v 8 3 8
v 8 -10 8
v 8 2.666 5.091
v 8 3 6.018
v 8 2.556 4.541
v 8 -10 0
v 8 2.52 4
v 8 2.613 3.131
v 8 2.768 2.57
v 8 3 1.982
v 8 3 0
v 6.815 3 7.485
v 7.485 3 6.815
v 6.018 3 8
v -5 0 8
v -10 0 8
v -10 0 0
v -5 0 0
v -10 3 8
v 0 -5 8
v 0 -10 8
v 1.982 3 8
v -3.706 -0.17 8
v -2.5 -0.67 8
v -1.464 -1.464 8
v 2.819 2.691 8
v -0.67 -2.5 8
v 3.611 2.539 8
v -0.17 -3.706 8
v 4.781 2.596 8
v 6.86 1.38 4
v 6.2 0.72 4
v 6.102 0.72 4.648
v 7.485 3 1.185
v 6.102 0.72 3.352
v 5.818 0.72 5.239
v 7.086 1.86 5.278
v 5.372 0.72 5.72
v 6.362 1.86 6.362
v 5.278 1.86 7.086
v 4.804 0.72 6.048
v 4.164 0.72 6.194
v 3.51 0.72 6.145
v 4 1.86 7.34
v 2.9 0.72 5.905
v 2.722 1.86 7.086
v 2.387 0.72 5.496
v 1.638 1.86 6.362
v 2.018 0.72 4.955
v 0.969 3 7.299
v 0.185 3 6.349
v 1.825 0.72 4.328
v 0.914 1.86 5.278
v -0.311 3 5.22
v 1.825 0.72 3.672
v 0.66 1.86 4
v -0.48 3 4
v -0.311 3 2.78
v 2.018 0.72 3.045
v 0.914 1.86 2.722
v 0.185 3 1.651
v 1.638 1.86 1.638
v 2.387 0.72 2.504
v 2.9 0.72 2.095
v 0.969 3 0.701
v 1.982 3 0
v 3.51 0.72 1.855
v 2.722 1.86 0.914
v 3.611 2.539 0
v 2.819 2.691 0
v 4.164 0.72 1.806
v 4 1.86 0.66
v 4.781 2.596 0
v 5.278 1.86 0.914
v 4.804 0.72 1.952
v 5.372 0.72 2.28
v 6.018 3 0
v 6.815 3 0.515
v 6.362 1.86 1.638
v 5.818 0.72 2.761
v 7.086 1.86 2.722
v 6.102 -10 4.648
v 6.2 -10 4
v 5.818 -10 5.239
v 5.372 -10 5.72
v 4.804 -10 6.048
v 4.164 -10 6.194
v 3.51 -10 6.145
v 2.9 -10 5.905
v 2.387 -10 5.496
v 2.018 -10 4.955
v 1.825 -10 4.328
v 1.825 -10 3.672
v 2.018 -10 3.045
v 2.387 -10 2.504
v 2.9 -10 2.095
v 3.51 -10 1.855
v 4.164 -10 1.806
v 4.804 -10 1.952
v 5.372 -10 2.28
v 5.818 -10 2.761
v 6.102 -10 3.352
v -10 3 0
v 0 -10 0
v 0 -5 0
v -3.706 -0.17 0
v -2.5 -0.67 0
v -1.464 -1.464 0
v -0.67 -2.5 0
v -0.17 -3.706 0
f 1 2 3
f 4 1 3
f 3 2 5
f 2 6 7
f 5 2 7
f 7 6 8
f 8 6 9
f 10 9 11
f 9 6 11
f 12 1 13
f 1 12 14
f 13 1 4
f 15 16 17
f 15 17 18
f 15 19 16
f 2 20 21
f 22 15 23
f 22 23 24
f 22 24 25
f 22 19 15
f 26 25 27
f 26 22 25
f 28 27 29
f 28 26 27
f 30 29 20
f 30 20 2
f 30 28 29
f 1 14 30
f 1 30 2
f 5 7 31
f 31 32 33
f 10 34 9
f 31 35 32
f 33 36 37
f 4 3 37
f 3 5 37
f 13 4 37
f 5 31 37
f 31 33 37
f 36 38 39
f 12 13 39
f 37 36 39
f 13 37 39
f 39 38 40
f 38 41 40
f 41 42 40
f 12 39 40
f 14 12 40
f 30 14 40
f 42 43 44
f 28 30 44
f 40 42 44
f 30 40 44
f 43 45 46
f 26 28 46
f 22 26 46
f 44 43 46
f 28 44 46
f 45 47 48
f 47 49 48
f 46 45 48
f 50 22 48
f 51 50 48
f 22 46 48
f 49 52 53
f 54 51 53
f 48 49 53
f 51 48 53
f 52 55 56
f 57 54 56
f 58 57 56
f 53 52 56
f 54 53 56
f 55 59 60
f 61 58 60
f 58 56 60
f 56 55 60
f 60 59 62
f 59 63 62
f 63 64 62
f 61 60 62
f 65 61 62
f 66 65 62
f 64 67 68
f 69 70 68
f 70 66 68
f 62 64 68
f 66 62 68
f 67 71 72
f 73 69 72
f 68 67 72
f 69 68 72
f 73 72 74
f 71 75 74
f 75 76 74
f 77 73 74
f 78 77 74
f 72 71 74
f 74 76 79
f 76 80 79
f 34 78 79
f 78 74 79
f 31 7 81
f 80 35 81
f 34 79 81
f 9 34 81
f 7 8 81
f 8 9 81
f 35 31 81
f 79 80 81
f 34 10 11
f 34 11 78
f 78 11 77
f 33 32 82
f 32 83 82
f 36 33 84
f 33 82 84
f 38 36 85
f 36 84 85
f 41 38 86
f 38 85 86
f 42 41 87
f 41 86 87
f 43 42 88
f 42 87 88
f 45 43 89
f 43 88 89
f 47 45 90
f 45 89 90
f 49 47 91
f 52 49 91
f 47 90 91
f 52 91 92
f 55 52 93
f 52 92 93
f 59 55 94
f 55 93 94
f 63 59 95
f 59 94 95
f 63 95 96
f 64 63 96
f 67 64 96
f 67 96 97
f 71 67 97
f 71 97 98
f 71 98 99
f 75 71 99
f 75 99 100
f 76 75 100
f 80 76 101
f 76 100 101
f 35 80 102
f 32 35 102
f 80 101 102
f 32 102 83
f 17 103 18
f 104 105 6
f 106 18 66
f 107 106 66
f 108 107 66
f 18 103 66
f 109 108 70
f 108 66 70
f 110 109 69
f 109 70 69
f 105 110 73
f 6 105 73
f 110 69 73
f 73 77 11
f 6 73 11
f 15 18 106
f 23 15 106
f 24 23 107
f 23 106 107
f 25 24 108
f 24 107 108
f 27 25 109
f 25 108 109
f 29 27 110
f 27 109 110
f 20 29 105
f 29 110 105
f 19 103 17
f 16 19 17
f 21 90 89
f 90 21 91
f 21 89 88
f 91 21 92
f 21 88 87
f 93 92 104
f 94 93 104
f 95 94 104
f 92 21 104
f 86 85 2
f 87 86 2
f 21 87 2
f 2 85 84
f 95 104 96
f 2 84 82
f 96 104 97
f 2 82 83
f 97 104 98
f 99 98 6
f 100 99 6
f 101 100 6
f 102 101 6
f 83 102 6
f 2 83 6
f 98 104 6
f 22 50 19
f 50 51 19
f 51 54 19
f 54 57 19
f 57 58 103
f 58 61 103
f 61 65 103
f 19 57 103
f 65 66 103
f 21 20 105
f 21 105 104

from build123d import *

# Parameters (mm, degrees)
F1_DEPTH       = 8
F3_D           = 4.4
F3_CSINK_D     = 8.96
F3_CSINK_ANGLE = 90


with BuildPart() as f1:
    # F0 (on Top) → F1 (new body)
    with BuildSketch(Plane.XY):
        with BuildLine():
            Line((-10, 0), (-5, 0))
            ThreePointArc((-5, 0), (-1.4644660941, -1.4644660941), (0, -5))
            Line((0, -5), (0, -10))
            Line((0, -10), (8, -10))
            Line((8, -10), (8, 3))
            Line((8, 3), (-10, 3))
            Line((-10, 3), (-10, 0))
        make_face()
    extrude(amount=F1_DEPTH)

    # F3 (through all)
    with Locations(Plane(origin=(0, 3, 0), x_dir=(-1, 0, 0), z_dir=(0, 1, 0))):
        with Locations((-4, 4)):
            CounterSinkHole(F3_D / 2, F3_CSINK_D / 2, counter_sink_angle=F3_CSINK_ANGLE)


solid = f1.part
